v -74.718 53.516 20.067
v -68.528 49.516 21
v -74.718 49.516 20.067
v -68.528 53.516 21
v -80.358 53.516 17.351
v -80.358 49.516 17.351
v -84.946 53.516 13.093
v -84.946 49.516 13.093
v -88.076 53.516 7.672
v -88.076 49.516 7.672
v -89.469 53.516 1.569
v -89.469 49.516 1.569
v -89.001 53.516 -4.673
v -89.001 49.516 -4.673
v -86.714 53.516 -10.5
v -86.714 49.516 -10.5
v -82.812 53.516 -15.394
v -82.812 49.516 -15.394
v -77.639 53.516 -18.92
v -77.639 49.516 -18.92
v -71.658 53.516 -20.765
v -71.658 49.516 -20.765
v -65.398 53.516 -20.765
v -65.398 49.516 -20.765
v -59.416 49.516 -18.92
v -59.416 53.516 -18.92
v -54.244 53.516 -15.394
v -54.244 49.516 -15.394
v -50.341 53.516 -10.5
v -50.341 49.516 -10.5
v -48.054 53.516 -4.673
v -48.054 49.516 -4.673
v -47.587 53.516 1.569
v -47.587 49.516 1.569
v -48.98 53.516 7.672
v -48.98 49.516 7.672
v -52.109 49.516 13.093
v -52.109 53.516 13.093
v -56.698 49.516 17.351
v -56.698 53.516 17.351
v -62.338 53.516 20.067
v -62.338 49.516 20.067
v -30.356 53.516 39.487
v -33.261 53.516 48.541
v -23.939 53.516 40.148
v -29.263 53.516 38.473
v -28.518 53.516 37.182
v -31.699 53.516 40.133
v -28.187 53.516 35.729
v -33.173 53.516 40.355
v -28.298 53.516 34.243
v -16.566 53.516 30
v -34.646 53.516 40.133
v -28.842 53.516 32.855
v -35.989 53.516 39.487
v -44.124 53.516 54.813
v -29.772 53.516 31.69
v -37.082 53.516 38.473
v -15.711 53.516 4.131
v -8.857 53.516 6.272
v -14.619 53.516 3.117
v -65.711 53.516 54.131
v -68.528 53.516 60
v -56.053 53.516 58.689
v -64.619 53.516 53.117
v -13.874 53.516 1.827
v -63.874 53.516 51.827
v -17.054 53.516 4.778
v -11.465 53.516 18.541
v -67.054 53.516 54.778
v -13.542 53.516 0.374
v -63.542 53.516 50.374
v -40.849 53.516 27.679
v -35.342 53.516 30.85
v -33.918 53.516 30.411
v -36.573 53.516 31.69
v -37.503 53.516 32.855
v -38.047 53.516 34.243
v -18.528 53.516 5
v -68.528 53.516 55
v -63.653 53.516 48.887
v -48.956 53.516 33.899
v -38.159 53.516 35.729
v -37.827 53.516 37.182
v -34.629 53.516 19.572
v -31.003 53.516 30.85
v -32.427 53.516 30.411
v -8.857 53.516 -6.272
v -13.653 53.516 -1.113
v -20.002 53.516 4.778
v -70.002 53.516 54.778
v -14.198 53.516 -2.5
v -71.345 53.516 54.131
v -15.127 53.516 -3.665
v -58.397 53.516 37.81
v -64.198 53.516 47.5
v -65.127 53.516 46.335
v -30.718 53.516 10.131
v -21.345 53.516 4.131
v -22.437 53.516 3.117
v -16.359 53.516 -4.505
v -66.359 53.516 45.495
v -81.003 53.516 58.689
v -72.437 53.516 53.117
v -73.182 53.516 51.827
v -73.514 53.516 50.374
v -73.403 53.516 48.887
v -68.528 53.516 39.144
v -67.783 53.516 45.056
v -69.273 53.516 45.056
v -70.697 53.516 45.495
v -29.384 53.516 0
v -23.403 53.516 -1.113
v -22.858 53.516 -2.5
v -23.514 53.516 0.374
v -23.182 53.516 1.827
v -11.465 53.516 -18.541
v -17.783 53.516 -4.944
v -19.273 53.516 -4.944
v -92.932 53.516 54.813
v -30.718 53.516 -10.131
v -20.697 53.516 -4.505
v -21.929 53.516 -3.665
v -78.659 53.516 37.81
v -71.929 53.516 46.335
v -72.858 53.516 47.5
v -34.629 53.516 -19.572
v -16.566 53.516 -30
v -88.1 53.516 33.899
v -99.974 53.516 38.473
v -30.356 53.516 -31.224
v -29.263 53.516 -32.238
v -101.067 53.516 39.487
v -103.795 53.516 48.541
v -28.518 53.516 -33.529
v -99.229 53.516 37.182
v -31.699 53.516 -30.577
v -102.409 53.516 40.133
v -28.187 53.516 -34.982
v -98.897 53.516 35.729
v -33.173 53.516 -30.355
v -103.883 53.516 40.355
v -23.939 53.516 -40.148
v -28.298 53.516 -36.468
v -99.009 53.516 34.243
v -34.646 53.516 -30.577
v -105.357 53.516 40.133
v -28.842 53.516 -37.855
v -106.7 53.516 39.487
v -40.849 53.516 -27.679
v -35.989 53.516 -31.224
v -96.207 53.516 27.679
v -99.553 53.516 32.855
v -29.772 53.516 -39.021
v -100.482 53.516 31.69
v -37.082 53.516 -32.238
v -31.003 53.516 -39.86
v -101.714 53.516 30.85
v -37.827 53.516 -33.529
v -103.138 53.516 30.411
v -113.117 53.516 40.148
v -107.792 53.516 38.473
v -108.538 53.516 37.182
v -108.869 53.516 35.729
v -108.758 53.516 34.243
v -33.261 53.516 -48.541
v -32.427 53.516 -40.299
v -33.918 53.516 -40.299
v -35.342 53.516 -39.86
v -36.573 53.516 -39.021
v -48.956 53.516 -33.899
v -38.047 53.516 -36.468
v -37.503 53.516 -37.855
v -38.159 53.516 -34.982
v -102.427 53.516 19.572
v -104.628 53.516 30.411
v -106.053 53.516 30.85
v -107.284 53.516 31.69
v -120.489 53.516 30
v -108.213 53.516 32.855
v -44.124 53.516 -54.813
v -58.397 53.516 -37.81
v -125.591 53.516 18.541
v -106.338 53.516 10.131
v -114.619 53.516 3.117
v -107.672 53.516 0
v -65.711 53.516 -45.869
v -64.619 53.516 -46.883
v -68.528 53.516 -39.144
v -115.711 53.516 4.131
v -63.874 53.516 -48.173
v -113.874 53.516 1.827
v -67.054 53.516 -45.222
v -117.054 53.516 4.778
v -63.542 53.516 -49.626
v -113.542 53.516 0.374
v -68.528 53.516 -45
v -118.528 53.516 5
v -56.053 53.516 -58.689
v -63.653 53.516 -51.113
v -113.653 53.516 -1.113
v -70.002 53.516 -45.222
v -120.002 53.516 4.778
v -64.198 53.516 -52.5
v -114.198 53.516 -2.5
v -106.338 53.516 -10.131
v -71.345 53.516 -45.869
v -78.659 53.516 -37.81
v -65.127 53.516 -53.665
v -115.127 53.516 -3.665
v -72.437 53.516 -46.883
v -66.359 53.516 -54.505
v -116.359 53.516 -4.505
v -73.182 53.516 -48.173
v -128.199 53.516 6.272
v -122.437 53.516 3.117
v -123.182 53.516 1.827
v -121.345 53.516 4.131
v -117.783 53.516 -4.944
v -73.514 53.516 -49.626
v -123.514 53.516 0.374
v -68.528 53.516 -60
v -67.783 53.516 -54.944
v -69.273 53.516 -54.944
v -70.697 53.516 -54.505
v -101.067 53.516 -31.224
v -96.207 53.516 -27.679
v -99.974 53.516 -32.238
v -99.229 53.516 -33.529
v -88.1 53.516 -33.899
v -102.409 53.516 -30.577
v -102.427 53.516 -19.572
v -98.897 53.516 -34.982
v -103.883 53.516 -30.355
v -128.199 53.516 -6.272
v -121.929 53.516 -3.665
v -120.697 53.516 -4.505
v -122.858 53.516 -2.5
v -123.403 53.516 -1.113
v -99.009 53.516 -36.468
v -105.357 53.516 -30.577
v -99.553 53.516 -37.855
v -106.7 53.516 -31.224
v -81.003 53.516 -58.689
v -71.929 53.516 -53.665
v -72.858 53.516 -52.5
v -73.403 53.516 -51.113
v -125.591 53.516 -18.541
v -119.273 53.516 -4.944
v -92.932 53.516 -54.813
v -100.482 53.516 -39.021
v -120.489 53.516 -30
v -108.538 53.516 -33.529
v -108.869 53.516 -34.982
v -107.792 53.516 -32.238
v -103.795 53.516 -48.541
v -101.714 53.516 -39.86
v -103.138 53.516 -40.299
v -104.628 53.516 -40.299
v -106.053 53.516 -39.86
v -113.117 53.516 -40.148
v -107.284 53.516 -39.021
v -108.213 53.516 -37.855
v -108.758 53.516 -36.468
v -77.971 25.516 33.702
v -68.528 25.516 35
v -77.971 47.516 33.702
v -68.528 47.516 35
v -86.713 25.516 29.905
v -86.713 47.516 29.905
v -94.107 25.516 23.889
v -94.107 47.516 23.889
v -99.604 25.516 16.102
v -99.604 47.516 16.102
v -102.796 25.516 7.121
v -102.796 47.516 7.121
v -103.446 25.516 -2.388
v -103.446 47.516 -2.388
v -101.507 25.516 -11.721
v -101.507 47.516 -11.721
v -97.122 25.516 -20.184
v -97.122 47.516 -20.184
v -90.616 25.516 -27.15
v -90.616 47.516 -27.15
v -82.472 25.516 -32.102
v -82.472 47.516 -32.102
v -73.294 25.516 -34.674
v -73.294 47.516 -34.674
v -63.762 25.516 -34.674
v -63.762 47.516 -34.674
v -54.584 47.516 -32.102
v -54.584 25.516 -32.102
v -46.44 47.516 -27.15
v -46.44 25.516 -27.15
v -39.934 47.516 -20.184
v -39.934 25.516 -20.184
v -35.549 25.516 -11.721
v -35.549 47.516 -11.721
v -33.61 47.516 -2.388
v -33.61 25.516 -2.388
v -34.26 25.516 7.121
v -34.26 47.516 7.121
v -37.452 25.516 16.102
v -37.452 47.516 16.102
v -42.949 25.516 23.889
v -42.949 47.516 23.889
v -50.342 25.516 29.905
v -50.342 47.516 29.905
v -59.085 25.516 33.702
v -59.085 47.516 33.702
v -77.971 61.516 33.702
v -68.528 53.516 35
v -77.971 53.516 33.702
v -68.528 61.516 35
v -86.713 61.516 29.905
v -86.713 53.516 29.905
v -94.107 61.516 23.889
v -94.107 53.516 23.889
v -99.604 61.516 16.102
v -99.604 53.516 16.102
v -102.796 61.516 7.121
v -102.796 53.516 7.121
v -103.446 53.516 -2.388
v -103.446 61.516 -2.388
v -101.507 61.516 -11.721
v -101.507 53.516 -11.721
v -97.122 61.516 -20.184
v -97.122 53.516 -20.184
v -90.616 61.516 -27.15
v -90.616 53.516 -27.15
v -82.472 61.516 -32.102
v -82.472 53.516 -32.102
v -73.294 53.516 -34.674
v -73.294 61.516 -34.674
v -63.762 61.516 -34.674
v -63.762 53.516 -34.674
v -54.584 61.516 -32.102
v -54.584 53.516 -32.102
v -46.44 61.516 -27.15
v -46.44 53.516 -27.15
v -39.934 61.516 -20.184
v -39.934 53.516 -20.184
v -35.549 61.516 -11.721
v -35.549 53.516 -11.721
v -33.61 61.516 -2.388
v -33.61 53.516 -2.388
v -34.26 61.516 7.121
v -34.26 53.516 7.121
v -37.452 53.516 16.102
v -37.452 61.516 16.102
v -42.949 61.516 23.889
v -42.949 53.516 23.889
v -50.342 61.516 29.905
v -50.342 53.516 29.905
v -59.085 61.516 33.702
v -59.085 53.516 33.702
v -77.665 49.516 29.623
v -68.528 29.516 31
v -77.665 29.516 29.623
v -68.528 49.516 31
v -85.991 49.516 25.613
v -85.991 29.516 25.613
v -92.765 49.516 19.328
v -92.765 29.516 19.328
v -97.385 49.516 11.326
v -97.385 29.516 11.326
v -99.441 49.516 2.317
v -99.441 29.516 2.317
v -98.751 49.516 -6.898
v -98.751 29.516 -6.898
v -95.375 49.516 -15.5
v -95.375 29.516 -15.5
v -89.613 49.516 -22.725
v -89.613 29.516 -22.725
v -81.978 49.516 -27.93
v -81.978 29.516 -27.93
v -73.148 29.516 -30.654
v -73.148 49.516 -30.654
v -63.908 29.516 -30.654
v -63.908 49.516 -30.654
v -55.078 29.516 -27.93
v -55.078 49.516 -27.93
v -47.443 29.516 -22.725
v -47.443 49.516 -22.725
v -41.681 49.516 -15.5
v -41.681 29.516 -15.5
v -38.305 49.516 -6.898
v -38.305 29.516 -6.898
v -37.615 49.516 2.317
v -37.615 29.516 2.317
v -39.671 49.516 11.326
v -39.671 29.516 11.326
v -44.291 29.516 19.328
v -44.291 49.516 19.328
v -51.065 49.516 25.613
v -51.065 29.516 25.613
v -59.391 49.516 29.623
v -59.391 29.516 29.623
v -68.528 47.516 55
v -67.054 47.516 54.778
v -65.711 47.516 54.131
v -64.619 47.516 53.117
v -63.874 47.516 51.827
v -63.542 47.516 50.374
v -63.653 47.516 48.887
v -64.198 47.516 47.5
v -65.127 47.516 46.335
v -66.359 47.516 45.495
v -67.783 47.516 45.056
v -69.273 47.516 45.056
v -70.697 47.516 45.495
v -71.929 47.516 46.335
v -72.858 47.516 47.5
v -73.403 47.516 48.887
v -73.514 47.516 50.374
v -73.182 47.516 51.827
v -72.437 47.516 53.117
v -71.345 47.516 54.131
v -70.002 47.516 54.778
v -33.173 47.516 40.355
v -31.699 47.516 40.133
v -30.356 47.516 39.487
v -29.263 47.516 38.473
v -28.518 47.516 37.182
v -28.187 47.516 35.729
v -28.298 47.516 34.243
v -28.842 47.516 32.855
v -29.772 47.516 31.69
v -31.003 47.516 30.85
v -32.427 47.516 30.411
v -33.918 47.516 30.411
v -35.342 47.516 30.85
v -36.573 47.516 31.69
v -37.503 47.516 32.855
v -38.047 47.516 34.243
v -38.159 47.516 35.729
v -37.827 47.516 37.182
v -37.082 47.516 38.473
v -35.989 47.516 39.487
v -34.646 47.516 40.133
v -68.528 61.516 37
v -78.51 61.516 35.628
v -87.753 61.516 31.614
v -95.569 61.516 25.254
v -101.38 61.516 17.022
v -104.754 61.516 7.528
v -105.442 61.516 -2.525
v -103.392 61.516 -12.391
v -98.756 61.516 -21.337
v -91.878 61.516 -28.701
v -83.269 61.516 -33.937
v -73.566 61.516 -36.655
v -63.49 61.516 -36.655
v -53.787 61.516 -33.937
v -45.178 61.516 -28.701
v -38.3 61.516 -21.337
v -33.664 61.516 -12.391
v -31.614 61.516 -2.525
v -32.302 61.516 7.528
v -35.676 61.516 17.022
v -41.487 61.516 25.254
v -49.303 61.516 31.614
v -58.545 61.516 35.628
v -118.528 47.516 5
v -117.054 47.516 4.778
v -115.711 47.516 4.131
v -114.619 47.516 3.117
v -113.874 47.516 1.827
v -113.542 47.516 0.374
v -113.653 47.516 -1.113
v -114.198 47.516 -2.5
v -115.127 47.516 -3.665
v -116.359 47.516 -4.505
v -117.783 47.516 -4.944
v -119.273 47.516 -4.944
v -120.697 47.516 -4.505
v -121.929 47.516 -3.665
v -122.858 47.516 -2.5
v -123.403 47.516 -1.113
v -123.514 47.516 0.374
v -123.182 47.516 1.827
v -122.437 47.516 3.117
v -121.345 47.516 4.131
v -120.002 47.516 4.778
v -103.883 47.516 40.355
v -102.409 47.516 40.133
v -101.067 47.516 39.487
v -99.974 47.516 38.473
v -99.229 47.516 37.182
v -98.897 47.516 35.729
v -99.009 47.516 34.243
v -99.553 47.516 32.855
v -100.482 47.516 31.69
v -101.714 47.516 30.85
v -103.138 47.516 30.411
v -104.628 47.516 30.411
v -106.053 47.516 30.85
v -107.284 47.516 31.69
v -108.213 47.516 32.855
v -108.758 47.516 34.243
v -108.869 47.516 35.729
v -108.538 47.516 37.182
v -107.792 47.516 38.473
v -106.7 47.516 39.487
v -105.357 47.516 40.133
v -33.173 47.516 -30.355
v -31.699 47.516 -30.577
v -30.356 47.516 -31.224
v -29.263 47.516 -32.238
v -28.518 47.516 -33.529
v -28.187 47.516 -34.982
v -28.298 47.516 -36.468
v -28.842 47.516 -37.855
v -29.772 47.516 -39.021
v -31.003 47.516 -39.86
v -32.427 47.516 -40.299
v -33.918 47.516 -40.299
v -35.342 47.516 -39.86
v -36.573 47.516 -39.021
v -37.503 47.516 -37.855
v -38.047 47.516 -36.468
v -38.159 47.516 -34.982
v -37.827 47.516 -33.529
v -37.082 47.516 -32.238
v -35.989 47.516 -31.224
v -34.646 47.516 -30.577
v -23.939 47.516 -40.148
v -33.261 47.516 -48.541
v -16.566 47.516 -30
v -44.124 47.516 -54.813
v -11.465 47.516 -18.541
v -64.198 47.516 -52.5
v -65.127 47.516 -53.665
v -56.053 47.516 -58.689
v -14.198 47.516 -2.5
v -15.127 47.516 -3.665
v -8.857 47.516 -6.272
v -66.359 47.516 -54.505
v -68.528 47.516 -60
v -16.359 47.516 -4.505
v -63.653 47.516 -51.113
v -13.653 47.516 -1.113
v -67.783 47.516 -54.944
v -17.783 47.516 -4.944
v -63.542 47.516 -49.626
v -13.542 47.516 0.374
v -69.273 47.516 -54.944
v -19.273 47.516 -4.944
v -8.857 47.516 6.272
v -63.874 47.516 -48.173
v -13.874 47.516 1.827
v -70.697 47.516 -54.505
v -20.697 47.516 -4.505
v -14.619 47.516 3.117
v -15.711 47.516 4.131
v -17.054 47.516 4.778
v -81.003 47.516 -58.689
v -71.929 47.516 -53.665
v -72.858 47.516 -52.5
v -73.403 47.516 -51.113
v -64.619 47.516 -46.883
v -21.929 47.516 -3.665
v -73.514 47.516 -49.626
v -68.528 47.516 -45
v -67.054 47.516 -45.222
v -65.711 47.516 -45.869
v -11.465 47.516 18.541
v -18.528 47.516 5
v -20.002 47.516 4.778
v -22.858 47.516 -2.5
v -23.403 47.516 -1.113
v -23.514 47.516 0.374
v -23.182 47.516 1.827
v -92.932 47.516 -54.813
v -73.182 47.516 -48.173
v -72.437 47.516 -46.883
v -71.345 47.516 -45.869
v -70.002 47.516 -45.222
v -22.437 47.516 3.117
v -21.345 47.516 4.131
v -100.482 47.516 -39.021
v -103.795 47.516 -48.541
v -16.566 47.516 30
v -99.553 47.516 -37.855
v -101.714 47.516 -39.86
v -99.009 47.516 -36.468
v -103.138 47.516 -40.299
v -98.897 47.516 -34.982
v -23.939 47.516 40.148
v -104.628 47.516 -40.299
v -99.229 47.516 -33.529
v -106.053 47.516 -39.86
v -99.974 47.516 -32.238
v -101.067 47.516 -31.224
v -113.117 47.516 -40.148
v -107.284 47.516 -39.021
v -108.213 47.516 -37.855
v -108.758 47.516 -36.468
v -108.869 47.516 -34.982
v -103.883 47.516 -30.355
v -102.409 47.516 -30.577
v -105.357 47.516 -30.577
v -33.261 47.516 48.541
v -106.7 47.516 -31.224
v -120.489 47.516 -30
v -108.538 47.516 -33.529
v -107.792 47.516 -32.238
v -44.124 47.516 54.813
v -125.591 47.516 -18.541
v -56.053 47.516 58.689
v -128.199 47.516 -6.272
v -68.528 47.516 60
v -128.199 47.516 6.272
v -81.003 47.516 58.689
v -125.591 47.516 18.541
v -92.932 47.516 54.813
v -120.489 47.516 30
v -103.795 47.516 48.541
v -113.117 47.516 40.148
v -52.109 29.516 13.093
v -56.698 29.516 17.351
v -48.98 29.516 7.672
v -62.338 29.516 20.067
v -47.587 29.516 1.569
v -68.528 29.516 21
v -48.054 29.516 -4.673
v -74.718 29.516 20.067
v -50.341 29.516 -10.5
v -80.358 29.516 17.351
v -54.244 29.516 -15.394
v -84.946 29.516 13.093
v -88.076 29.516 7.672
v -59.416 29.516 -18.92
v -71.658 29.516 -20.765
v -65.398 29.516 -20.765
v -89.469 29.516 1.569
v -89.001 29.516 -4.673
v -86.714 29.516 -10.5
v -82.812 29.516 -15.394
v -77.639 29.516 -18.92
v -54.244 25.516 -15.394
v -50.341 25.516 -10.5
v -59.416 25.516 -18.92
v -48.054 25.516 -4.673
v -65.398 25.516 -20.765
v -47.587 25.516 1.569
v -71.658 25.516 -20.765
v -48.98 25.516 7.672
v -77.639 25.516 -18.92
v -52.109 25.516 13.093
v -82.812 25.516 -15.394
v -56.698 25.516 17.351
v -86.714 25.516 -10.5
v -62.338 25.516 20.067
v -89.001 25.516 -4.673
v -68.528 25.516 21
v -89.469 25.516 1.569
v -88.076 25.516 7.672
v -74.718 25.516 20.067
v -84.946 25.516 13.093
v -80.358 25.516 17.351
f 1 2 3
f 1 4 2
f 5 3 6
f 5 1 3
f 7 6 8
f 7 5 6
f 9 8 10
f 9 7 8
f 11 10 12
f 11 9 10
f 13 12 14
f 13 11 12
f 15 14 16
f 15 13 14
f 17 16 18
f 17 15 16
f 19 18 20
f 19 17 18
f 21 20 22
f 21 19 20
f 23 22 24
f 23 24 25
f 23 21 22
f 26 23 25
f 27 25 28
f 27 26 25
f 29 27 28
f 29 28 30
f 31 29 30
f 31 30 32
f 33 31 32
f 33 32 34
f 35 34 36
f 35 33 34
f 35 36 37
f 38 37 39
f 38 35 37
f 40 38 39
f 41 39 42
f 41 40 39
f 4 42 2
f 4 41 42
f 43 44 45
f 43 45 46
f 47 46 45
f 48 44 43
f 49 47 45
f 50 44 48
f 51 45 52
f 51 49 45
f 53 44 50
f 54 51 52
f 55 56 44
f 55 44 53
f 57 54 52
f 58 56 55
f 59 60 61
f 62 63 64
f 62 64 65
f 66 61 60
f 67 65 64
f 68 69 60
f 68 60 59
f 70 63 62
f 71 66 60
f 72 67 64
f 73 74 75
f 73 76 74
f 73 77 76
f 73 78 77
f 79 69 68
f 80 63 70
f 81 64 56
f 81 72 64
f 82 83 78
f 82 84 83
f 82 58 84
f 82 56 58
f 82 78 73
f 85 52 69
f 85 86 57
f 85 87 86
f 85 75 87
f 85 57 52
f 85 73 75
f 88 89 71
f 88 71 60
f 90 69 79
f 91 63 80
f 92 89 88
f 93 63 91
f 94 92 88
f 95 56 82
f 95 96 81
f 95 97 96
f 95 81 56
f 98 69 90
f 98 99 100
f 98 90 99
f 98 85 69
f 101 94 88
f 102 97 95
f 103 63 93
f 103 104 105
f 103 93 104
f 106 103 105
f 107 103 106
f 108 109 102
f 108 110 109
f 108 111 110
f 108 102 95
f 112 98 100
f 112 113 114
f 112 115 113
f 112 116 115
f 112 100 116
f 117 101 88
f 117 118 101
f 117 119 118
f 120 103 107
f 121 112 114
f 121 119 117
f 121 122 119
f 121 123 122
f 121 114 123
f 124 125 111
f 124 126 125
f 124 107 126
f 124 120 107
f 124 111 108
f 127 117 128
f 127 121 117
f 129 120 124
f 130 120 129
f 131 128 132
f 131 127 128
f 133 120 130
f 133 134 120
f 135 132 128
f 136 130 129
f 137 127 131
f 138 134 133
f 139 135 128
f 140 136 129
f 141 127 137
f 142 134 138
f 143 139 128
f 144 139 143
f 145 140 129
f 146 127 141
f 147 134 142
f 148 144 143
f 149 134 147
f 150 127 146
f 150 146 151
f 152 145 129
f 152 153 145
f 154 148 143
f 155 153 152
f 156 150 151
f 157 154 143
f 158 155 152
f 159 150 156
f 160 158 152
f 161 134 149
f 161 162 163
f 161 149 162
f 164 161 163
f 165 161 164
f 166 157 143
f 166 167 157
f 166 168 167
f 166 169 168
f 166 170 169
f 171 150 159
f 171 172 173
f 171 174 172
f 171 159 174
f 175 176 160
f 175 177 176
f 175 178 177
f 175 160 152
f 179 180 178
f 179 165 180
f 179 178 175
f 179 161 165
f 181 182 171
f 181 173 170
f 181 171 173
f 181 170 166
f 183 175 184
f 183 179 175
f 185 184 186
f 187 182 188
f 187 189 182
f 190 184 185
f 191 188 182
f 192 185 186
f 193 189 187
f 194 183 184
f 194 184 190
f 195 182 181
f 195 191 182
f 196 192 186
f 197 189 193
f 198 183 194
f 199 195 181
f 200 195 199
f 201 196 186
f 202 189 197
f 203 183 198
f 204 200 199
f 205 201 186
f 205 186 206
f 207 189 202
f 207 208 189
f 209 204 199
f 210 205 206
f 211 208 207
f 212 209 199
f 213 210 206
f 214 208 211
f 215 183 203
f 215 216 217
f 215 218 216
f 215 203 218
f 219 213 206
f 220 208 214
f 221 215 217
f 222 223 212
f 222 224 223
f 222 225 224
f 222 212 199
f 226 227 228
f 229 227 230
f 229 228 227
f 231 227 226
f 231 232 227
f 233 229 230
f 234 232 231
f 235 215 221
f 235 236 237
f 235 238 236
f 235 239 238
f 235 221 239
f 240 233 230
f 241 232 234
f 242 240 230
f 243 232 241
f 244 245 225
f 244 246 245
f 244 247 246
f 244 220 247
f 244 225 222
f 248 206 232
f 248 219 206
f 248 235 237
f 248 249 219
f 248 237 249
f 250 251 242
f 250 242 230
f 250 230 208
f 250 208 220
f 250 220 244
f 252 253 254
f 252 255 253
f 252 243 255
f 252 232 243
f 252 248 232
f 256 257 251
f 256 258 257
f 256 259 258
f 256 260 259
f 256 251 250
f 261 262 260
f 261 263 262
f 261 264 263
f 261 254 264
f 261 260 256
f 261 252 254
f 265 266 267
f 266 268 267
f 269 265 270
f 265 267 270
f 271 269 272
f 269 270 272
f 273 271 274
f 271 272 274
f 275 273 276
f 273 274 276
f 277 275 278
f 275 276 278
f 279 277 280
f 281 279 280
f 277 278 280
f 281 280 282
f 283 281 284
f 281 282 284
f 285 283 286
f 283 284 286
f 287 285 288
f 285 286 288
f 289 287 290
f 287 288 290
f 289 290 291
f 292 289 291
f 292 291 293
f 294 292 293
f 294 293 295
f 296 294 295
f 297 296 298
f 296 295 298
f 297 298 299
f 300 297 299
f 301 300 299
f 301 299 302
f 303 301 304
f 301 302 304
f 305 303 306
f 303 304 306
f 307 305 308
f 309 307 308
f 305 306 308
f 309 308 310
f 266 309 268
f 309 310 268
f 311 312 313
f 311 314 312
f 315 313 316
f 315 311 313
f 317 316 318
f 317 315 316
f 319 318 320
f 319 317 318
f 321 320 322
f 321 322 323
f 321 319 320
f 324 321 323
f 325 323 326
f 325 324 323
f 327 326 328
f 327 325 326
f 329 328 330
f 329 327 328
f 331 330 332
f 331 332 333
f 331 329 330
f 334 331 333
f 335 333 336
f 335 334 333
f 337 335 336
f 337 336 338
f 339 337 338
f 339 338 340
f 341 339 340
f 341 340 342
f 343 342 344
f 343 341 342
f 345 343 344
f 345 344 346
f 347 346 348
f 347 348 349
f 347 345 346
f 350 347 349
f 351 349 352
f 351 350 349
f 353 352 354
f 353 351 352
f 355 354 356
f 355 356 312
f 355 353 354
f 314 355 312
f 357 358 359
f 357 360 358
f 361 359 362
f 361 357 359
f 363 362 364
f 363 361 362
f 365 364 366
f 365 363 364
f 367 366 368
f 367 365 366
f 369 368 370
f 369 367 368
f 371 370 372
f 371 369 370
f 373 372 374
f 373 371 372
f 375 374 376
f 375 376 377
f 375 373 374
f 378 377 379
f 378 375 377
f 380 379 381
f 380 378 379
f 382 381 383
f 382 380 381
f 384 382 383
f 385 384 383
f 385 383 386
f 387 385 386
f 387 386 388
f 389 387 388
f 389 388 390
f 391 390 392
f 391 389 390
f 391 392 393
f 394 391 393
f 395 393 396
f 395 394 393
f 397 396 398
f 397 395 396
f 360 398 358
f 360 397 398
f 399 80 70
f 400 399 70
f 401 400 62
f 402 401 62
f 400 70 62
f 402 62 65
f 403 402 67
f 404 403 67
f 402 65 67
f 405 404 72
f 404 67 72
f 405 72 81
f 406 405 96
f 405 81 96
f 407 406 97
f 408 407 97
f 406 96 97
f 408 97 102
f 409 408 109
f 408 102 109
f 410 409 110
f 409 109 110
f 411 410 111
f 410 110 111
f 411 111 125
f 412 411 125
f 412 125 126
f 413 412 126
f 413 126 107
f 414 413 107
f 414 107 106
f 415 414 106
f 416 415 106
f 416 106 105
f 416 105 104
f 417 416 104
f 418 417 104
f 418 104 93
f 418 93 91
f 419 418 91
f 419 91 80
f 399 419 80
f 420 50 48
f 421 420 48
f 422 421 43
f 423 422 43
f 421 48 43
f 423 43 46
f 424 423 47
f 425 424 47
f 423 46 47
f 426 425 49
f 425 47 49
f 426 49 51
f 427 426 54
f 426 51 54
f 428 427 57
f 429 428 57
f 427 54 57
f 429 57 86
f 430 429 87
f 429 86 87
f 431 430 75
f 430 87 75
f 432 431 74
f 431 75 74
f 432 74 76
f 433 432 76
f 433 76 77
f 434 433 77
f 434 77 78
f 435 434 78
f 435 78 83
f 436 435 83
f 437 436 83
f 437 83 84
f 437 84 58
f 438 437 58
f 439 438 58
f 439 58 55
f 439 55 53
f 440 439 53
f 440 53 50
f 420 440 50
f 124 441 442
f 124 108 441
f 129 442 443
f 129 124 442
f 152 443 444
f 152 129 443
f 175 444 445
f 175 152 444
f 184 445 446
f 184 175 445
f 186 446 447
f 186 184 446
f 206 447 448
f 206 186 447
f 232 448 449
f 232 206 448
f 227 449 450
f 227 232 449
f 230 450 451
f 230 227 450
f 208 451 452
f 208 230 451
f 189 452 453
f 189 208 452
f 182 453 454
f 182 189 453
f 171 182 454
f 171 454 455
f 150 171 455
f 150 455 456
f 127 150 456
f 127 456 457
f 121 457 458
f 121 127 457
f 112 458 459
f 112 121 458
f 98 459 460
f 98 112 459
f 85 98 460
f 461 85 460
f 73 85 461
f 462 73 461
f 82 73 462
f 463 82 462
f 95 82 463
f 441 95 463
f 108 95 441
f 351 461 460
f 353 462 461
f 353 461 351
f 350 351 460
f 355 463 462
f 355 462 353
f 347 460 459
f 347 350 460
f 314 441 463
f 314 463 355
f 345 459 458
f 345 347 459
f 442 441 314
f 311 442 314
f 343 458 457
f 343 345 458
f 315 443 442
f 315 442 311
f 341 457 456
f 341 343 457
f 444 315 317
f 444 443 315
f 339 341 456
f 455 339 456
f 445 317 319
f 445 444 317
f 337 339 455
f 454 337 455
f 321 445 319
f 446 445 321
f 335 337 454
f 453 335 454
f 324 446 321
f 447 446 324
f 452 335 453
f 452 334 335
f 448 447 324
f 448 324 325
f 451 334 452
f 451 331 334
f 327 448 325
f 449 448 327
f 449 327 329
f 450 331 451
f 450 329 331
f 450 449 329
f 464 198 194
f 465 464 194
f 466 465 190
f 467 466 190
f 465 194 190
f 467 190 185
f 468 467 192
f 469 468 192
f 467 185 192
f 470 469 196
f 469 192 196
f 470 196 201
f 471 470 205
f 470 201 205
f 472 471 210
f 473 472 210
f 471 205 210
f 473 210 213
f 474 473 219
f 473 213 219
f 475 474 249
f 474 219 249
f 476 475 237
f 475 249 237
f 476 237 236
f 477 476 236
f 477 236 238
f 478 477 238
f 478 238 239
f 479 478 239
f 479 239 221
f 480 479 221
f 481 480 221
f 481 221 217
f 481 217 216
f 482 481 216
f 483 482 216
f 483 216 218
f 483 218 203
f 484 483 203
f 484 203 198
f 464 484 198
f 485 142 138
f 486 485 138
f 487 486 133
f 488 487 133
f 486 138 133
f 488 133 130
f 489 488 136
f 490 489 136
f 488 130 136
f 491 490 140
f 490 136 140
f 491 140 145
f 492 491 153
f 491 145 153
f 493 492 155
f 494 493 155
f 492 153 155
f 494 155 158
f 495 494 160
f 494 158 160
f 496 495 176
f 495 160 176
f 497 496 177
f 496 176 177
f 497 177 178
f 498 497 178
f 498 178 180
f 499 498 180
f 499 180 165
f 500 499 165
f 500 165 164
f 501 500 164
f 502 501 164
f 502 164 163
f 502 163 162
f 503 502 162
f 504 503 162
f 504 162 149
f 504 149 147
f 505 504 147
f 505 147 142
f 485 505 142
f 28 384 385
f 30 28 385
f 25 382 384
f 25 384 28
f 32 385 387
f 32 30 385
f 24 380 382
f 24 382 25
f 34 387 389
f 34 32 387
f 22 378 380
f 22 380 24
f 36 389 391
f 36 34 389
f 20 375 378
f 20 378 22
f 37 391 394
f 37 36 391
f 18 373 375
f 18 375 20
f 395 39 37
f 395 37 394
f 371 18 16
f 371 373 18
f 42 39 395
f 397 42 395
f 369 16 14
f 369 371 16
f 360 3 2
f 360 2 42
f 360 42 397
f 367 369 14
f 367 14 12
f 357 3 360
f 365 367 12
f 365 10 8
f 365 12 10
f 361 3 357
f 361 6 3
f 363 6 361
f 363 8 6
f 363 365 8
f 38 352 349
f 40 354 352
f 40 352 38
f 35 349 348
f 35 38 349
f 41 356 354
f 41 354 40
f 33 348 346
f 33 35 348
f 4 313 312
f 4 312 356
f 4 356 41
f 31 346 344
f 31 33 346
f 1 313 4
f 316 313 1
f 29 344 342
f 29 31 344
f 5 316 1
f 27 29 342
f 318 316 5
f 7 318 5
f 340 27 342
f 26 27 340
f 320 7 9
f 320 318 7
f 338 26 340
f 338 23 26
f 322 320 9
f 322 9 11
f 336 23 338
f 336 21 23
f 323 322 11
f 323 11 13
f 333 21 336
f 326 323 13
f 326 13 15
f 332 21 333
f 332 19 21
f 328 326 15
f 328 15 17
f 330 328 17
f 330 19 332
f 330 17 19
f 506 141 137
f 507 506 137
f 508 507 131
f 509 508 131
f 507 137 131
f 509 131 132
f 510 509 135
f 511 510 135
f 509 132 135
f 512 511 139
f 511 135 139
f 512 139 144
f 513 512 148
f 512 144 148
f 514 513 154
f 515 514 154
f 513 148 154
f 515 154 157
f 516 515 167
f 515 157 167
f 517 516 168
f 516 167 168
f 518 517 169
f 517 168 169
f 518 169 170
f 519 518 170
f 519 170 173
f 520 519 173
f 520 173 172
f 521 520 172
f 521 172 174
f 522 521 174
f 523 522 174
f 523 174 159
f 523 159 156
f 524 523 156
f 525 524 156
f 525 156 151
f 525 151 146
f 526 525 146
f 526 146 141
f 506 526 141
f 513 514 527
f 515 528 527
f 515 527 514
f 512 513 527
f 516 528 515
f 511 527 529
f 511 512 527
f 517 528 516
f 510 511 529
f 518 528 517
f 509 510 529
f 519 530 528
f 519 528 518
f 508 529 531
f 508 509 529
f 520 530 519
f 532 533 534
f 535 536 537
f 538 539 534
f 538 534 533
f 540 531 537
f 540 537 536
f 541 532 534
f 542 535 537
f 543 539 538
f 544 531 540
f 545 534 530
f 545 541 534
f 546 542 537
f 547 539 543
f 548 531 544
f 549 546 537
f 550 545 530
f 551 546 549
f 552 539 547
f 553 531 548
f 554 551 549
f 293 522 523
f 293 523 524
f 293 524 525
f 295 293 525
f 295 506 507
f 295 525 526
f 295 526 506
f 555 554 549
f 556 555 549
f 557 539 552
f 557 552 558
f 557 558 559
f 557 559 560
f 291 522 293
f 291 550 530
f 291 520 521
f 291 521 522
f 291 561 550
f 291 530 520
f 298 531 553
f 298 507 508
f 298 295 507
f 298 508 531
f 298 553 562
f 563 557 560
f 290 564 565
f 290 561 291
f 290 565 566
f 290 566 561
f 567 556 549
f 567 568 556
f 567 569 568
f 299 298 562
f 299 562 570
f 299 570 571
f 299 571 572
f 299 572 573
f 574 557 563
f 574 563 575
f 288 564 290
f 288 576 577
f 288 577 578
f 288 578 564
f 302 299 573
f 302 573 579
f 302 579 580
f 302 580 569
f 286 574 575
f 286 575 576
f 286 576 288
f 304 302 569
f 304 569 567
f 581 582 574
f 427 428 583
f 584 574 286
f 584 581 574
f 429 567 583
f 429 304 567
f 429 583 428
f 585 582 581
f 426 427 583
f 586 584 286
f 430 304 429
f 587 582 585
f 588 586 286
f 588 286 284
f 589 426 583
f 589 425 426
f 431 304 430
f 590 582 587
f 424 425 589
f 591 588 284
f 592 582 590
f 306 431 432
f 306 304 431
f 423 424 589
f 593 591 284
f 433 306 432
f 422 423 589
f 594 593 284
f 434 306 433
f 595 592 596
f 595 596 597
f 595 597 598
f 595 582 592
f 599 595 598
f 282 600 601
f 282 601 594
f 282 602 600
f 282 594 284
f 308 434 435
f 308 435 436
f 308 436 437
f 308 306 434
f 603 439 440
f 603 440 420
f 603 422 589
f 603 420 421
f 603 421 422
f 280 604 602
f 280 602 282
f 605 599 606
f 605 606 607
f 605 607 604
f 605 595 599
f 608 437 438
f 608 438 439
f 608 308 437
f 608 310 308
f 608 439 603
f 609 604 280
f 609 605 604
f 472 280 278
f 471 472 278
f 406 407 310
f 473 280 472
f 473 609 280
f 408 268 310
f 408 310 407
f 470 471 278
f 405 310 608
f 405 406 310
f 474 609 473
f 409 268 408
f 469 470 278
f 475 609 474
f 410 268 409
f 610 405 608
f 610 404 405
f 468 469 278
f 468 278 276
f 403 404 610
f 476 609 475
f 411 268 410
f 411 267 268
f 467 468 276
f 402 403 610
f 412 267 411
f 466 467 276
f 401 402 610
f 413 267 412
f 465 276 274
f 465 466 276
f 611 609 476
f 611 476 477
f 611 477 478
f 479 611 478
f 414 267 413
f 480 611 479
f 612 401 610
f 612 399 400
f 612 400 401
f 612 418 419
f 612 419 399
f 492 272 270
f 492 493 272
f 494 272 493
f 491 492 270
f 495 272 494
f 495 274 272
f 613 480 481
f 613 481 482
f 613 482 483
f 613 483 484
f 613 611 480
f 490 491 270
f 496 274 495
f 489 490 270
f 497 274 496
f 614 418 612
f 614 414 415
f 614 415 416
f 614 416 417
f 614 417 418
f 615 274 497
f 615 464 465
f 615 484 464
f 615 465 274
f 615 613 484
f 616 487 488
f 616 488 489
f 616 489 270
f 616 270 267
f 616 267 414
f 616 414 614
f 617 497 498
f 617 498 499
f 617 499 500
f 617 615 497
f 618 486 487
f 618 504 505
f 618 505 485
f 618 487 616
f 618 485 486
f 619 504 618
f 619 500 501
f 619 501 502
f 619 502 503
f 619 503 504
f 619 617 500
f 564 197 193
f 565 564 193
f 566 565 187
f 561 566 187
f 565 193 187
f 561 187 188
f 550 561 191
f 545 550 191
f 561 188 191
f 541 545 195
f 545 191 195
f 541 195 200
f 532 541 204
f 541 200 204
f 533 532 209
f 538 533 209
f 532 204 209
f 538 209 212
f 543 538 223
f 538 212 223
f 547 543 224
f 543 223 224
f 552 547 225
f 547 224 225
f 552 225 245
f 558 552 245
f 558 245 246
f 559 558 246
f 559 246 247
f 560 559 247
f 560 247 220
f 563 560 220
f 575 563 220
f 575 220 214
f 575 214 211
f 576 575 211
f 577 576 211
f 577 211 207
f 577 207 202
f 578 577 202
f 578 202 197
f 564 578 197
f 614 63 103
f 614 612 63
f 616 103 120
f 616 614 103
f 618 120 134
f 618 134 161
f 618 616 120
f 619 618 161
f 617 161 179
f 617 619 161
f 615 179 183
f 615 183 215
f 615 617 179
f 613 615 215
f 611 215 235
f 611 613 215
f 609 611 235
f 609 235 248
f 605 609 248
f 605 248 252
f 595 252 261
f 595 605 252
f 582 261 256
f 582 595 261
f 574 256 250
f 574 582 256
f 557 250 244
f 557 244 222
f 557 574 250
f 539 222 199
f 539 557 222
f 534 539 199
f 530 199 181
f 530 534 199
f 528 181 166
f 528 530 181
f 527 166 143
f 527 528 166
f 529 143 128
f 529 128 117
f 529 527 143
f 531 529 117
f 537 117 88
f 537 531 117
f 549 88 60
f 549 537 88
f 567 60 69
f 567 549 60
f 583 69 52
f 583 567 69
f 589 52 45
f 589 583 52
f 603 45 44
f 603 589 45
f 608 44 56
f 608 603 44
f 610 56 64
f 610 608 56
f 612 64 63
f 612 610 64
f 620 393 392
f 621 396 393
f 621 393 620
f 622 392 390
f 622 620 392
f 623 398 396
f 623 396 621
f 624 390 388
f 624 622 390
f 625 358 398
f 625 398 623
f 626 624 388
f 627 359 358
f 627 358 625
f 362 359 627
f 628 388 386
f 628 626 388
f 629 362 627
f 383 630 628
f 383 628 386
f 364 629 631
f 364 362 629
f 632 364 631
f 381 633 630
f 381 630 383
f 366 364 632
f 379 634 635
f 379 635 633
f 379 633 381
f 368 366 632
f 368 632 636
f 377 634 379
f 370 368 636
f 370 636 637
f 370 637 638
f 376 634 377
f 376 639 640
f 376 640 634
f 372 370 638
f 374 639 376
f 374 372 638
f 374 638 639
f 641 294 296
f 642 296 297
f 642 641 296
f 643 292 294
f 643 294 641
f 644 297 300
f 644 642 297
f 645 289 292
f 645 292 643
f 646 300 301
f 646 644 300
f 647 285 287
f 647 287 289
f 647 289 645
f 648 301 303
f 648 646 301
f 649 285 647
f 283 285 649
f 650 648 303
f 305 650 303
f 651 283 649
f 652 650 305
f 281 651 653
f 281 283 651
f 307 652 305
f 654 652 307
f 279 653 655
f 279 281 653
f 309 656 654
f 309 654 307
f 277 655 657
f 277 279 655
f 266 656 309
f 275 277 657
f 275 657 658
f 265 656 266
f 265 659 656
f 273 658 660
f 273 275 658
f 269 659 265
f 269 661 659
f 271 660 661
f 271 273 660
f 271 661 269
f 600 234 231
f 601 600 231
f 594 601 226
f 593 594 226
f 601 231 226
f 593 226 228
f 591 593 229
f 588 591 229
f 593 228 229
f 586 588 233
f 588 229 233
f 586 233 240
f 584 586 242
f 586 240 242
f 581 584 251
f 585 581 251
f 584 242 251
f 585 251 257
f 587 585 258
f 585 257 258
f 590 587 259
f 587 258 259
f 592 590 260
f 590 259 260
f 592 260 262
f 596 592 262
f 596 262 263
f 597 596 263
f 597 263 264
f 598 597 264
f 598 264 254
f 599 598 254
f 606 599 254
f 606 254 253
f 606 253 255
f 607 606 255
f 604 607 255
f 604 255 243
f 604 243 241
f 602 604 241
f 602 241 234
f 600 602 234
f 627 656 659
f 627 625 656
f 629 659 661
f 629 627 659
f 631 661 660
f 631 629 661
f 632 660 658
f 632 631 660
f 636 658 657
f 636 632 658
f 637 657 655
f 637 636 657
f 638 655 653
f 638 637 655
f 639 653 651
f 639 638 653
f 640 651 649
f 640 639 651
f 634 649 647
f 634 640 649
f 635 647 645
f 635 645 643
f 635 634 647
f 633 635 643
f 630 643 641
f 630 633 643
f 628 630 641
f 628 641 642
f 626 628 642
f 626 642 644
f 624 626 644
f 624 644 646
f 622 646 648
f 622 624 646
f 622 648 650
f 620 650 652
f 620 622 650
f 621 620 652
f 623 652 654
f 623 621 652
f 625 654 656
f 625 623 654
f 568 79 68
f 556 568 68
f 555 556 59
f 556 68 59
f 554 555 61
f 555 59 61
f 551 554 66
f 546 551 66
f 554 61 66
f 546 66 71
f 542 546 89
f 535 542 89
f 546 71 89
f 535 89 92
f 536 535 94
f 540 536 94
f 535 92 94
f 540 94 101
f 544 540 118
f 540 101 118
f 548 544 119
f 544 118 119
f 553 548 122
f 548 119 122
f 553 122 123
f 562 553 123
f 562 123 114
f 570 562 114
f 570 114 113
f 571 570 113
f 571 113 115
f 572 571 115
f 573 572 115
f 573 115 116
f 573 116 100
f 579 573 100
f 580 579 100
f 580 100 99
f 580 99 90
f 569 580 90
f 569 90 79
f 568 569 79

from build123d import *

# Parameters (mm, degrees)
SKETCH3_R          = 5
CUT_EXTRUDE1_DEPTH = 10


with BuildPart() as part:
    # Sketch2 → Revolve1 (revolve)
    with BuildSketch(Plane.XY, mode=Mode.PRIVATE) as revolve1_sk:
        Polygon((-47.527918782, 29.515656182), (-37.527918782, 29.515656182), (-37.527918782, 49.515656182), (-47.527918782, 49.515656182), (-47.527918782, 53.515656182), (-33.527918782, 53.515656182), (-33.527918782, 61.515656182), (-31.527918782, 61.515656182), (-29.384325242, 53.515656182), (-8.527918782, 53.515656182), (-8.527918782, 47.515656182), (-33.527918782, 47.515656182), (-33.527918782, 27.427572824), (-33.527918782, 25.515656182), (-47.527918782, 25.515656182), align=None)
    revolve(revolve1_sk.sketch.rotate(Axis((-68.527918782, 64.847715736, 0), (0, -1, 0)), 90), axis=Axis((-68.527918782, 64.847715736, 0), (0, -1, 0)))

    # Sketch3 → Cut-Extrude1 (cut)
    with BuildSketch(Plane(origin=(0, 53.515656182, 0), x_dir=(1, 0, 0), z_dir=(0, 1, 0))):
        with Locations(Location((-118.527918782, 0, 0), (0, 0, 270))):
            Circle(SKETCH3_R)
        with Locations(Location((-103.883257841, 35.355339059, 0), (0, 0, 270))):
            Circle(SKETCH3_R)
        with Locations(Location((-68.527918782, 50, 0), (0, 0, 270))):
            Circle(SKETCH3_R)
        with Locations(Location((-33.172579722, 35.355339059, 0), (0, 0, 270))):
            Circle(SKETCH3_R)
        with Locations(Location((-18.527918782, 0, 0), (0, 0, 270))):
            Circle(SKETCH3_R)
        with Locations(Location((-33.172579722, -35.355339059, 0), (0, 0, 270))):
            Circle(SKETCH3_R)
        with Locations(Location((-68.527918782, -50, 0), (0, 0, 270))):
            Circle(SKETCH3_R)
        with Locations(Location((-103.883257841, -35.355339059, 0), (0, 0, 270))):
            Circle(SKETCH3_R)
    extrude(amount=-CUT_EXTRUDE1_DEPTH, mode=Mode.SUBTRACT)


solid = part.part
